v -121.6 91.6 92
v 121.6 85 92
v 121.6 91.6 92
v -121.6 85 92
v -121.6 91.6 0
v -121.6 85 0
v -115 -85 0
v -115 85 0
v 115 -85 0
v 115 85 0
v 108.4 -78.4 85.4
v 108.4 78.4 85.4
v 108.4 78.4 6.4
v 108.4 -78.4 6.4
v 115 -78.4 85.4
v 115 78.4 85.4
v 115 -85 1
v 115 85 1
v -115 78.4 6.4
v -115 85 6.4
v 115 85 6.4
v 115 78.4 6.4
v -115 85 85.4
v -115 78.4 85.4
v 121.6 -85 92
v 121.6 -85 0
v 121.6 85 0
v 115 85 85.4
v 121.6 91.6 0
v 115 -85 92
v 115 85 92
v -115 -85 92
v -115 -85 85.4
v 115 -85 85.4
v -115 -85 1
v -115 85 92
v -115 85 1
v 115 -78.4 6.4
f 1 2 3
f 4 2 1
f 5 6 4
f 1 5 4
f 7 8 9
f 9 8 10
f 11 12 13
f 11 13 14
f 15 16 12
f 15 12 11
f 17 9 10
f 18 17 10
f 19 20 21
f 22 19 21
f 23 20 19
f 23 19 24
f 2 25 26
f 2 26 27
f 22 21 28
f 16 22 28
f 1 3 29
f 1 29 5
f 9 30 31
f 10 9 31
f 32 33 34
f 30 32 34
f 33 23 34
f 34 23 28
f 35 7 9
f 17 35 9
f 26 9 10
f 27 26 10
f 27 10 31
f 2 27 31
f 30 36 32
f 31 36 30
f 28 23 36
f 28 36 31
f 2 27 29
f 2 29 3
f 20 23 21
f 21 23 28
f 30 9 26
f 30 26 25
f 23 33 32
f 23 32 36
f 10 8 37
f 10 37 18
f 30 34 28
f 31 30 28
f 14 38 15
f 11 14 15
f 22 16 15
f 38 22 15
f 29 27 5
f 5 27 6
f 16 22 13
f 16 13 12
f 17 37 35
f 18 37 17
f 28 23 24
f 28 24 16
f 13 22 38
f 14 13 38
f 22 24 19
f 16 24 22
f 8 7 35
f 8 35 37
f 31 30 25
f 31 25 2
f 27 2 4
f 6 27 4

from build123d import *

# Parameters (mm, degrees)
F0_W      = 230
F0_H      = 170
F1_DEPTH  = 1
F2_W      = 170
F2_H      = 92
F3_DEPTH  = 6.6
F4_W      = 243.2
F4_H      = 92
F5_DEPTH  = 6.6
F6_W      = 230
F6_H      = 79
F7_DEPTH  = 6.6
F8_W      = 156.8
F8_H      = 79
F9_DEPTH  = 6.6
F10_W     = 230
F10_H     = 170
F11_DEPTH = 6.6


# Not quite as in the source:
# - a feature names something its author has since deleted; it is built from what else it names


with BuildPart() as f1:
    # F0 (on Top) → F1 (new body)
    with BuildSketch(Plane.XY):
        Rectangle(F0_W, F0_H)
    extrude(amount=F1_DEPTH)


with BuildPart() as f3:
    # F2 (on face) → F3 (new body)
    with BuildSketch(Plane.YZ.offset(115)):
        with Locations((0, 46)):
            Rectangle(F2_W, F2_H)
    extrude(amount=F3_DEPTH)


with BuildPart() as f5:
    # F4 (on face) → F5 (new body)
    with BuildSketch(Plane(origin=(0, 85, 0), x_dir=(-1, 0, 0), z_dir=(0, 1, 0))):
        with Locations((0, 46)):
            Rectangle(F4_W, F4_H)
    extrude(amount=F5_DEPTH)


with BuildPart() as f7:
    # F6 (on face) → F7 (new body)
    with BuildSketch(Plane.XZ.offset(-85)):
        with Locations((0, 45.9)):
            Rectangle(F6_W, F6_H)
    extrude(amount=F7_DEPTH)


with BuildPart() as f9:
    # F8 (on face) → F9 (new body)
    with BuildSketch(Plane(origin=(115, 0, 0), x_dir=(0, -1, 0), z_dir=(-1, 0, 0))):
        with Locations((0, 45.9)):
            Rectangle(F8_W, F8_H)
    extrude(amount=F9_DEPTH)


with BuildPart() as f11:
    # F10 (on face) → F11 (new body)
    with BuildSketch(Plane.XY.offset(85.4)):
        Rectangle(F10_W, F10_H)
    extrude(amount=F11_DEPTH)


solid = Compound([f1.part, f3.part, f5.part, f7.part, f9.part, f11.part])
